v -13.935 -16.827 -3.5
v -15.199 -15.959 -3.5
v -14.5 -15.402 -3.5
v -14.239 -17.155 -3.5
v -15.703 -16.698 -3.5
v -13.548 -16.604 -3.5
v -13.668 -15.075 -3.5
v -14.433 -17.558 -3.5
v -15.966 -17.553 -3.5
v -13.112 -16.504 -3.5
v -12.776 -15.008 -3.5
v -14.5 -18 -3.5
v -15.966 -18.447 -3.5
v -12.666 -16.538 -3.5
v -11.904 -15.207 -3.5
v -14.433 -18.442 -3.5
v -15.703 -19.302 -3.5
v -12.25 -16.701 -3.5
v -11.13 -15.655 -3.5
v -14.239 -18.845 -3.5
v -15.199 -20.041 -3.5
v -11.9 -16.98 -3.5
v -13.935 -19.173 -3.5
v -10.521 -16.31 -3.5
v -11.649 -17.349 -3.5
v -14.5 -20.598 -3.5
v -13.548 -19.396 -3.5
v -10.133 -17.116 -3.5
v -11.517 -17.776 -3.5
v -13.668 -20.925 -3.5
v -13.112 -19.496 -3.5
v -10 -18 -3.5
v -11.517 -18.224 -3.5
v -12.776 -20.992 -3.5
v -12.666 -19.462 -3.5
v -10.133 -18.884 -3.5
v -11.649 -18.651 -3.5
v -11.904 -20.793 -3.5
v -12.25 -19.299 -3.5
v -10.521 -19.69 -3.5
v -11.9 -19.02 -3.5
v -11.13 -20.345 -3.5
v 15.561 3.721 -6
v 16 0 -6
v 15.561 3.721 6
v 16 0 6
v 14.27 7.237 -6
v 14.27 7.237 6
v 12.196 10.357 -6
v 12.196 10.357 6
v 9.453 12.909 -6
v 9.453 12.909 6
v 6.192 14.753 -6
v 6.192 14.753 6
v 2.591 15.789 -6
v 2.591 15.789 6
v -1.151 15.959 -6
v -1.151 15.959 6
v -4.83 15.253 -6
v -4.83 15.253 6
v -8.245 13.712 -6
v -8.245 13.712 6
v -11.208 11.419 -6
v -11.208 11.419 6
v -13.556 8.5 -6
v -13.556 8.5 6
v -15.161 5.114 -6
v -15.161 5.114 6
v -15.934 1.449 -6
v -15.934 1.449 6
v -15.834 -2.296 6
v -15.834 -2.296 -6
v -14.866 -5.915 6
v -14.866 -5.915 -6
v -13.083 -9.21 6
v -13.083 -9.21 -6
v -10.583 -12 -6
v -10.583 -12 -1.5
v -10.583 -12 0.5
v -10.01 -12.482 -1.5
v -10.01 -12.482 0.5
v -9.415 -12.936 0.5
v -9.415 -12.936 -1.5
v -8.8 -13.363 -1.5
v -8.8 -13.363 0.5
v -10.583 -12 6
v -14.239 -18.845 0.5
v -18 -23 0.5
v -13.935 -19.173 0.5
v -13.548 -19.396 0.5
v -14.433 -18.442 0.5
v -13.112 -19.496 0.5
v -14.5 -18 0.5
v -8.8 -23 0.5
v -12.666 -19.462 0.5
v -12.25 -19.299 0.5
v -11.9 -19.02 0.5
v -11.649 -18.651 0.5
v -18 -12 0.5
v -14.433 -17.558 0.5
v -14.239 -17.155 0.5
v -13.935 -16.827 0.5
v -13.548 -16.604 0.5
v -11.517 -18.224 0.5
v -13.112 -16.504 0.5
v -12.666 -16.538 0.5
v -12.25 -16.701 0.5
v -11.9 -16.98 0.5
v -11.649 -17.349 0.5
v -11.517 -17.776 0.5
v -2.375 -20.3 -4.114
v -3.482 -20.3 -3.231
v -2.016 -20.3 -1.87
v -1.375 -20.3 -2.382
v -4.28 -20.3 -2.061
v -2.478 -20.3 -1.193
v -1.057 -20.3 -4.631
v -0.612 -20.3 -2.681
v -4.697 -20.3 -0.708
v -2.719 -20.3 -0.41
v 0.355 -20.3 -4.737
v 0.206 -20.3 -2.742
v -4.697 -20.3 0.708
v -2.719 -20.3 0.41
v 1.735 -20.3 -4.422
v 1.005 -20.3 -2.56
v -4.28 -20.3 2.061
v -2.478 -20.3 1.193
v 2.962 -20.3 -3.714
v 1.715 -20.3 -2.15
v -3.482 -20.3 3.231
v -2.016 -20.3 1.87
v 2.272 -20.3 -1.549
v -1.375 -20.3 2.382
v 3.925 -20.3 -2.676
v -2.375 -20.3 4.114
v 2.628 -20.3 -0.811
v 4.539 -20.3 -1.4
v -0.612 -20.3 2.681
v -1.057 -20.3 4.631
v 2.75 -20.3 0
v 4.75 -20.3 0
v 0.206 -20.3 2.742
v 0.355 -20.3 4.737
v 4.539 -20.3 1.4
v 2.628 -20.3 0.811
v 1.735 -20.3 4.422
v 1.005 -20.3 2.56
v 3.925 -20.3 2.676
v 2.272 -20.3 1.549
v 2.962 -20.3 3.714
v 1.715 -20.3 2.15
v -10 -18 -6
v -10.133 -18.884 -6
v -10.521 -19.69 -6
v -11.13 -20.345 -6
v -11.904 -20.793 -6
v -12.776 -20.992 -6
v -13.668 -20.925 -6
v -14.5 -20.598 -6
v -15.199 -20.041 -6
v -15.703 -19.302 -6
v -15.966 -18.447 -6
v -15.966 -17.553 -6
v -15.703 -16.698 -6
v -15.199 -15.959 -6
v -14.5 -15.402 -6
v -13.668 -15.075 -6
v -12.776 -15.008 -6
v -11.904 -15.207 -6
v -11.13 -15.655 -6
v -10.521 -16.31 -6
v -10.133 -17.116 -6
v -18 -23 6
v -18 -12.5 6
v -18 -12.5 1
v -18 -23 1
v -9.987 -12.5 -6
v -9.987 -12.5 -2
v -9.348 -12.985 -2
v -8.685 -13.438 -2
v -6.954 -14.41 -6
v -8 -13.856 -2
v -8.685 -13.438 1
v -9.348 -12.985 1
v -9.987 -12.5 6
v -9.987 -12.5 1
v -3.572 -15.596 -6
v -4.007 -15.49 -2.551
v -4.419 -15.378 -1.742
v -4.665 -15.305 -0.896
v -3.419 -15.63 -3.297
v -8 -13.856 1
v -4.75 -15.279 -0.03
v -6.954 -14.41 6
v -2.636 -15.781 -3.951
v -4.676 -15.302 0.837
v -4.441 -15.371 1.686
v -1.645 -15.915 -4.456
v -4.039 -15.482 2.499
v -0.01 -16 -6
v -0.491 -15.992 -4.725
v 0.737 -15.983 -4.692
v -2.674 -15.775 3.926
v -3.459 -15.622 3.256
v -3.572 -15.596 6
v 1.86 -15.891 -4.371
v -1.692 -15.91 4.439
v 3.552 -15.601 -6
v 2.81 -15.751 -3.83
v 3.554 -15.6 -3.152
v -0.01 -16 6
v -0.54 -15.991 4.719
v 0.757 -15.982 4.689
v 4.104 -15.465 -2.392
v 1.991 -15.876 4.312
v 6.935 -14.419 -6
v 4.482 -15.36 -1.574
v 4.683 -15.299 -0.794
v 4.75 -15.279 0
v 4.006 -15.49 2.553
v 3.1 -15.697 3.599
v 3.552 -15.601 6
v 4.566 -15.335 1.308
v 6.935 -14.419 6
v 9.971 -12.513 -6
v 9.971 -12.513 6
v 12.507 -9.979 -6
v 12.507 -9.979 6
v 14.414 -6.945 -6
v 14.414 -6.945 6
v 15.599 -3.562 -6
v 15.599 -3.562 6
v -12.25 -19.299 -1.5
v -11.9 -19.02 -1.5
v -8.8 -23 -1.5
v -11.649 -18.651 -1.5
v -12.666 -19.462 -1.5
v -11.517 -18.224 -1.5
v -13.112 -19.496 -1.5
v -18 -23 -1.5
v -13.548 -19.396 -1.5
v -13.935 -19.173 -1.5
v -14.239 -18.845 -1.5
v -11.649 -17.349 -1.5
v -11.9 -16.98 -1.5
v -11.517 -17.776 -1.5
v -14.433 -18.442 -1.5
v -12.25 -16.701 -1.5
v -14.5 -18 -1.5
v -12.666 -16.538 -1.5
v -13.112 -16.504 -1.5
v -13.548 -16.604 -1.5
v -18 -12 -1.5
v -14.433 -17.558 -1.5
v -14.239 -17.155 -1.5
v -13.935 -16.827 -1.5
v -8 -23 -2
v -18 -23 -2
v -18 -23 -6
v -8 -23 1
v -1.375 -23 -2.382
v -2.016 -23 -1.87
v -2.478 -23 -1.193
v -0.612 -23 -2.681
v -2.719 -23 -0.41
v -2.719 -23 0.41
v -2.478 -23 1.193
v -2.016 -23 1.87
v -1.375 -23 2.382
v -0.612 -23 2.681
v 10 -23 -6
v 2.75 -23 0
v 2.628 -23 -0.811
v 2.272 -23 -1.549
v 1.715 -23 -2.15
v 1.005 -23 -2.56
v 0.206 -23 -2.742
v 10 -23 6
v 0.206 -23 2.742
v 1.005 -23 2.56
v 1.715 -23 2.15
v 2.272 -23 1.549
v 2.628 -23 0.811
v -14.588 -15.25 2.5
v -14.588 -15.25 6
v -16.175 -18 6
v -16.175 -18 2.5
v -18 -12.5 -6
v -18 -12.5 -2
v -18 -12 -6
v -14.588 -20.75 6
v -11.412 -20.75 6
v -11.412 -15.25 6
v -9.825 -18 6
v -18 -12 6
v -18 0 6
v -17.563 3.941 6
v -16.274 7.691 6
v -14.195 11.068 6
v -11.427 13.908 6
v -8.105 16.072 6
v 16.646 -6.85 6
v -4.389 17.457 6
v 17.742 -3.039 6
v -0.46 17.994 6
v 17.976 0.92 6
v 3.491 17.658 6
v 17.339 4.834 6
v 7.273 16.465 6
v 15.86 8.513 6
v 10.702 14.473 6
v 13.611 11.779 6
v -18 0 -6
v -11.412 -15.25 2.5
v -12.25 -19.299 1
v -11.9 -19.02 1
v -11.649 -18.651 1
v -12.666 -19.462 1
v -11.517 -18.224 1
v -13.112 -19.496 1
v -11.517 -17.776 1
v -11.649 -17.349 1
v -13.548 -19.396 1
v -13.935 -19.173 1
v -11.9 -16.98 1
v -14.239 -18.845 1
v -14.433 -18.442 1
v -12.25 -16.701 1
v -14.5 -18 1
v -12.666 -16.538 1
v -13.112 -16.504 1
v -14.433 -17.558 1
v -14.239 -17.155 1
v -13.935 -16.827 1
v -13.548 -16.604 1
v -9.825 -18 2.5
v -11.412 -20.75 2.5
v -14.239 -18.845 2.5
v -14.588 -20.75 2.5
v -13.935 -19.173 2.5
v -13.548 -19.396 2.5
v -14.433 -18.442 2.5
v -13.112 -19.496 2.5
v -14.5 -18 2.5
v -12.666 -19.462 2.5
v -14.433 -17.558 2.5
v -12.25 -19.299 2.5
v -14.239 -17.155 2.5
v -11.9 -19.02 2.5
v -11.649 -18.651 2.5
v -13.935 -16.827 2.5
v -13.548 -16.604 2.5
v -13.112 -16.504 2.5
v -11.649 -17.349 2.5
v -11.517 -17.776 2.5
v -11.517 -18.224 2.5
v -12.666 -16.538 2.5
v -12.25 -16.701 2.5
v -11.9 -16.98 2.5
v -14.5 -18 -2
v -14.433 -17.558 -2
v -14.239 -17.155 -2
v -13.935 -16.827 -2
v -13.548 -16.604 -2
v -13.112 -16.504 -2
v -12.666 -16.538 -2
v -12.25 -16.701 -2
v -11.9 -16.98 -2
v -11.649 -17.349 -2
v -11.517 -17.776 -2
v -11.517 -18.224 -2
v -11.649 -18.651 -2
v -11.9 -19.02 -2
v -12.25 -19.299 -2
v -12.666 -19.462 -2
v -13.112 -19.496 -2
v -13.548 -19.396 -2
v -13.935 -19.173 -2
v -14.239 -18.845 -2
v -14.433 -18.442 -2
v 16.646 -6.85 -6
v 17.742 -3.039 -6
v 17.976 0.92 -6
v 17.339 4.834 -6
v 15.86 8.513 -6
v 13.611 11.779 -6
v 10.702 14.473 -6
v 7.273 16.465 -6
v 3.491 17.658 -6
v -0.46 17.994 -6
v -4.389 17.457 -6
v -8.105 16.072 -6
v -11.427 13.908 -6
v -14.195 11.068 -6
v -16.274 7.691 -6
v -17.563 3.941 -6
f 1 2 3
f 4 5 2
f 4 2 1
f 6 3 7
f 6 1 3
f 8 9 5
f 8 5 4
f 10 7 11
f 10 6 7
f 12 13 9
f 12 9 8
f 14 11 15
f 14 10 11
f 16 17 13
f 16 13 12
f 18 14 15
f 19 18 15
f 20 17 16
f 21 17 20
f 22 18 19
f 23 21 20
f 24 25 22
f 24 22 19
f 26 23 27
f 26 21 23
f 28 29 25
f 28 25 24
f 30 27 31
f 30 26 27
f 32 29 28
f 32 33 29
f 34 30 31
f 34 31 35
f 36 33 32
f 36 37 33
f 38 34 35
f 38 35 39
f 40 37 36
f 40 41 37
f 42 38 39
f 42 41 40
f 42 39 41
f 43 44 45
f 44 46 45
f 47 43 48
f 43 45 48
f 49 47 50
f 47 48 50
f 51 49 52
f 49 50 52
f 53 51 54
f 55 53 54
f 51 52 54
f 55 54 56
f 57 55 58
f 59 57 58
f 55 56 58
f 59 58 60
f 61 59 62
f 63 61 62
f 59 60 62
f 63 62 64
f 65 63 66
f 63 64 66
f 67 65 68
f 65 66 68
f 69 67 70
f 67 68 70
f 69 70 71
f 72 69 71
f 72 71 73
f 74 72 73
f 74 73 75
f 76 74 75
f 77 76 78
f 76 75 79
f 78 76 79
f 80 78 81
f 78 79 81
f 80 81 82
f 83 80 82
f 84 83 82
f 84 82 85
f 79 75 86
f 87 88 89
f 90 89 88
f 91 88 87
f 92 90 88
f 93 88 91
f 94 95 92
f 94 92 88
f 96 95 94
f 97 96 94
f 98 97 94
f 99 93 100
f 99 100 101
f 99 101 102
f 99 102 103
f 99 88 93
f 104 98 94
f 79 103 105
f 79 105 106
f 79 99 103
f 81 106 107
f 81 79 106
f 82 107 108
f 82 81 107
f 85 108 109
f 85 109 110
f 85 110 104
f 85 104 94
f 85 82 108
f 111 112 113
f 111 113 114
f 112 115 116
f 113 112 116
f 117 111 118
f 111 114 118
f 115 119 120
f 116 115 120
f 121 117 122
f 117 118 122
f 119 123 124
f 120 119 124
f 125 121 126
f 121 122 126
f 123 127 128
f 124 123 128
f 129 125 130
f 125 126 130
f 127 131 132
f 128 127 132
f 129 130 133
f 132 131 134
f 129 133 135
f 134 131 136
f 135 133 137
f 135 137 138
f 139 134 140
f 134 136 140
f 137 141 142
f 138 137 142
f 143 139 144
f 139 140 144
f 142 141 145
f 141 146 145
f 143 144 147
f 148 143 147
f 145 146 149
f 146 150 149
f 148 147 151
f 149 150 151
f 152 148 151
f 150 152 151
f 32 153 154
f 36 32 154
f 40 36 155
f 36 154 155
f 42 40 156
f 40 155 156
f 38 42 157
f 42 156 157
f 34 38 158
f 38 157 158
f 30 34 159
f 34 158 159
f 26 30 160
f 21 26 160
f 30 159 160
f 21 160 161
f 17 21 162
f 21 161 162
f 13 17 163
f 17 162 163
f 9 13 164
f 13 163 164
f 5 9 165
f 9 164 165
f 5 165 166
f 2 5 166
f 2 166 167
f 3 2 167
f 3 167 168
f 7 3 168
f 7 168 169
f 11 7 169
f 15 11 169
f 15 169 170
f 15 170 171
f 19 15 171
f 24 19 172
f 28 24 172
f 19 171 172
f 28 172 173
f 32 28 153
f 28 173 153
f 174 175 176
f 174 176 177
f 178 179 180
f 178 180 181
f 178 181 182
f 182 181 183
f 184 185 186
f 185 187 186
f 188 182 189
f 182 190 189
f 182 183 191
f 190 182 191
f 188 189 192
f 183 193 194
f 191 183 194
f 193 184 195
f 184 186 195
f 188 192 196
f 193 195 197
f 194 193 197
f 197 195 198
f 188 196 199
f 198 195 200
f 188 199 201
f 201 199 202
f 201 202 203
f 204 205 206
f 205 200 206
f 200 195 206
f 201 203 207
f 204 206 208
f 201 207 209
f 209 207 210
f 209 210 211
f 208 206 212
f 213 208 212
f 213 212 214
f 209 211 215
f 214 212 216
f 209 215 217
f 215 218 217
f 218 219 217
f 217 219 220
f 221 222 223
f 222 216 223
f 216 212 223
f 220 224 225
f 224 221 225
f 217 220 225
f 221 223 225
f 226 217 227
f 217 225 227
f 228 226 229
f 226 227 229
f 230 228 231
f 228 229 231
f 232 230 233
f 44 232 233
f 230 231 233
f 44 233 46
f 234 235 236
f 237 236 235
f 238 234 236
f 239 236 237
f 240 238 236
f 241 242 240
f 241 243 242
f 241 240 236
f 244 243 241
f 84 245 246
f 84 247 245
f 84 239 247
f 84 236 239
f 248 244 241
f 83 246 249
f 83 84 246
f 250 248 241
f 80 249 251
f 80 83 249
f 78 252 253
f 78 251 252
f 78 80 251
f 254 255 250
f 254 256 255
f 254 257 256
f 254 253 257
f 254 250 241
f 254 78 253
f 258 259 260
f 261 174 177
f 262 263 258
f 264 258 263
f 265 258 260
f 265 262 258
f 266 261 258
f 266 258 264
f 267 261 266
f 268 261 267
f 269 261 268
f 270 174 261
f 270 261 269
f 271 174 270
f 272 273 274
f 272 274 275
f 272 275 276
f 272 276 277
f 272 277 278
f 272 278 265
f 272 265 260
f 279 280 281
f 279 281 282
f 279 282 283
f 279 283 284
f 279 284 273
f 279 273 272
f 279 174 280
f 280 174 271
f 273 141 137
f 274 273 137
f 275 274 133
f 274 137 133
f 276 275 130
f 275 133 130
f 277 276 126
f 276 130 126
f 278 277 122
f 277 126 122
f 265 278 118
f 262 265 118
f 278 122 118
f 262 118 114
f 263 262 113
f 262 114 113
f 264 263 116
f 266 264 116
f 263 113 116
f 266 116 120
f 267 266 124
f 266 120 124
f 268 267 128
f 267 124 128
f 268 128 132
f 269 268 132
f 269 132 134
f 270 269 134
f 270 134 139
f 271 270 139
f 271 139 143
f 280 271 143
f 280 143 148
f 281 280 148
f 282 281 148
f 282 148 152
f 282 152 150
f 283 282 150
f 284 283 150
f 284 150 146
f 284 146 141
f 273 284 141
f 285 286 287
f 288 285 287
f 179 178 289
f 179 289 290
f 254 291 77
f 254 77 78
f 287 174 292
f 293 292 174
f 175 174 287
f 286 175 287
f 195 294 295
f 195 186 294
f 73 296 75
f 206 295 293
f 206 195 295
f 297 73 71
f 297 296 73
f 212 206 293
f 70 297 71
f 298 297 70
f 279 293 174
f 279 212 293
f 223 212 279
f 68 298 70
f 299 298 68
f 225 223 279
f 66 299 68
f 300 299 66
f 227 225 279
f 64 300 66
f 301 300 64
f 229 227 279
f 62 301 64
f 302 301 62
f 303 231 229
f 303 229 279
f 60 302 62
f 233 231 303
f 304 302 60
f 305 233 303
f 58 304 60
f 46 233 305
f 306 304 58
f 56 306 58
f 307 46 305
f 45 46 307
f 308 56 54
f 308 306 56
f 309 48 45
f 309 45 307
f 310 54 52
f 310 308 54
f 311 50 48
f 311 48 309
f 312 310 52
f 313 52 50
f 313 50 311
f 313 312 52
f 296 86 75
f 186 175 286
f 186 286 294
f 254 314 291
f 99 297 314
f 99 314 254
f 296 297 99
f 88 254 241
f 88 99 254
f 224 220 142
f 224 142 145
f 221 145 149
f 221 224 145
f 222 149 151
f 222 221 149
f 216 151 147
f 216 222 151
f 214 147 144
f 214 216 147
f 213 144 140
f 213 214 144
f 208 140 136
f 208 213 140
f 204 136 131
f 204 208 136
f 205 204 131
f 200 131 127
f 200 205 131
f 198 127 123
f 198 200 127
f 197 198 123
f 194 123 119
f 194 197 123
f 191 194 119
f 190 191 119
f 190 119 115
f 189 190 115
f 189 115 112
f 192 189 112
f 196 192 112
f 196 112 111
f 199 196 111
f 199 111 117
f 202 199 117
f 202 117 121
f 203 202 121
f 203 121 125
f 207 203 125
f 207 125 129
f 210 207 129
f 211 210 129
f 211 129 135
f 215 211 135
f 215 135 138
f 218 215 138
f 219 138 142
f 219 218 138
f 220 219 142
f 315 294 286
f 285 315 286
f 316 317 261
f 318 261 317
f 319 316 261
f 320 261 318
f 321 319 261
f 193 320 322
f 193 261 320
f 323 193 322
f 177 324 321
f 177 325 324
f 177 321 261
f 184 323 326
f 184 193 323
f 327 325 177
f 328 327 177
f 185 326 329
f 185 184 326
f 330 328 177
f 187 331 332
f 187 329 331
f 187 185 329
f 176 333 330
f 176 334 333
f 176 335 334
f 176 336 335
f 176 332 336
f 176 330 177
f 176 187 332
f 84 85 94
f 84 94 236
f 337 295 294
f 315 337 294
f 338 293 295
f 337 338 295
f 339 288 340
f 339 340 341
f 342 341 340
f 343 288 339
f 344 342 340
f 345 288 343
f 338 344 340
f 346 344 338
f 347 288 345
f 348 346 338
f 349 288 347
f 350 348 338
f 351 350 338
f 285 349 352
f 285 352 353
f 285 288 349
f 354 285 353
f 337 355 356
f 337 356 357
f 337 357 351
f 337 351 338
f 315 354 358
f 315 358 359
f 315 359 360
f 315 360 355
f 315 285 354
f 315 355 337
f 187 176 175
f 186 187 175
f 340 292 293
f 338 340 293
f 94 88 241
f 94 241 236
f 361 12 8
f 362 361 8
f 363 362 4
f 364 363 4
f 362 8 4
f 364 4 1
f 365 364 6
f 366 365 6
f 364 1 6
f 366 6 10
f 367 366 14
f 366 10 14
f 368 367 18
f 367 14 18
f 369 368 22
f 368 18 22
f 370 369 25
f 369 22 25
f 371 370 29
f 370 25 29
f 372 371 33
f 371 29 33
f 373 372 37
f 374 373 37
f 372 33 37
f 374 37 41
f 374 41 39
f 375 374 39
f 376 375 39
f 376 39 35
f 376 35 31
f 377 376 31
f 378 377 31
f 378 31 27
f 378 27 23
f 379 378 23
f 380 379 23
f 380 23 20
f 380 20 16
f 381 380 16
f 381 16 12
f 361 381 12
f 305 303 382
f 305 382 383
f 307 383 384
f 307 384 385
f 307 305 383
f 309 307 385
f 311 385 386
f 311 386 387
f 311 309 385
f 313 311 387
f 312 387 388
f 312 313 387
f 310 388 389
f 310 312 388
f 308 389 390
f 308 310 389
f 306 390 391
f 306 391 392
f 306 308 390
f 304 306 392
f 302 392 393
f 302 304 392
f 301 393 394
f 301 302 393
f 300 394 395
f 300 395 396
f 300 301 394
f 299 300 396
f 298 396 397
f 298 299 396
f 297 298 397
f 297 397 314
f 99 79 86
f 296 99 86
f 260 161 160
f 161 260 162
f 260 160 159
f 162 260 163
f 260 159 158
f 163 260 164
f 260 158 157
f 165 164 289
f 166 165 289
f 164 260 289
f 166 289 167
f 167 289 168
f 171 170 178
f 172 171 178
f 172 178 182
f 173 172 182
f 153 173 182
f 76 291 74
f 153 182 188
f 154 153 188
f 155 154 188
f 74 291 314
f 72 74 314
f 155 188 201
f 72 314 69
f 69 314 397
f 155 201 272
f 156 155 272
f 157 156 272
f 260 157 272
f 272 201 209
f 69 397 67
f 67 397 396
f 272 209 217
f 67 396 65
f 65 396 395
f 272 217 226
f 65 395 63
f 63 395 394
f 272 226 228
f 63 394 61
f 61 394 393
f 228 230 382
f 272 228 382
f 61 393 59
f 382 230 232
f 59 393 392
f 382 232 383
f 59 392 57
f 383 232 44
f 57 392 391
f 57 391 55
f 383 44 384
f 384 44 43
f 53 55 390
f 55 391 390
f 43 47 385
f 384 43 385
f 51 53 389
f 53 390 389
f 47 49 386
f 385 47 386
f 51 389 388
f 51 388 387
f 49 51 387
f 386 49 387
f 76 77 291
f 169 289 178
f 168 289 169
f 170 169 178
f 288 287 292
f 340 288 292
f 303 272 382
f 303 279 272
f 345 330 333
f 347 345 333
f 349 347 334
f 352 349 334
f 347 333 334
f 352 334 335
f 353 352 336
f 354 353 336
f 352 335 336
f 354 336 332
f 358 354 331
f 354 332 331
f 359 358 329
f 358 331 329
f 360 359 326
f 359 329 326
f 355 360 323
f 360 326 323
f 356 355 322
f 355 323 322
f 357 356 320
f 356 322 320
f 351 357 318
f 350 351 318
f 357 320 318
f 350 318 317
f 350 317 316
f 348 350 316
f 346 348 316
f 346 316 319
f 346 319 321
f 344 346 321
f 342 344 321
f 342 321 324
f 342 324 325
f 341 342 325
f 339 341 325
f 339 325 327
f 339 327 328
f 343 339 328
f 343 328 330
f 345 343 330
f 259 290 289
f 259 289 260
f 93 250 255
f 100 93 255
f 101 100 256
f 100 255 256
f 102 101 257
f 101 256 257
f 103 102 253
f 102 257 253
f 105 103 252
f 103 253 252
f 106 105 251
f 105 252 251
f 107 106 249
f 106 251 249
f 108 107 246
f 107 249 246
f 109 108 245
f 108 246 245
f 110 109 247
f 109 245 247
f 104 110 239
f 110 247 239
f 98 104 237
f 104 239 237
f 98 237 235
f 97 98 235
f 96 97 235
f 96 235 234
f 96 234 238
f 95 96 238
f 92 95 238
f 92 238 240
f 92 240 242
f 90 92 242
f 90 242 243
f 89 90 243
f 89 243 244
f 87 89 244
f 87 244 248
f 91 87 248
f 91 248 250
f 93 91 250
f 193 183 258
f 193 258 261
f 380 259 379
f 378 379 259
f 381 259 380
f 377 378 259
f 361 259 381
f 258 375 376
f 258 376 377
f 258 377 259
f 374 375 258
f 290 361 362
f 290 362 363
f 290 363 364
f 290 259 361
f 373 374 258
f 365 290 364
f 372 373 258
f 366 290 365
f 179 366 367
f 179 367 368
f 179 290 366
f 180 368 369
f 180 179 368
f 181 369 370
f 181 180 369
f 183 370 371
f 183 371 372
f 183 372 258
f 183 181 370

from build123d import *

# Parameters (mm, degrees)
F0_R          = 16
F1_DEPTH      = 6
F1_DEPTH_BACK = 6
F4_DEPTH      = 25
F5_W          = 0.5
F5_H          = 4
F5_H_2        = 5
F6_DEPTH      = 8.0135078223
F8_D          = 3
F9_DEPTH      = 3.5
F10_R         = 3
F11_DEPTH     = 2.5
F13_D         = 5.5
F13_DEPTH     = 23.001
F14_R         = 4.75
F15_DEPTH     = 20.3


with BuildPart() as f1:
    # F0 (on Top) → F1 (new body, two sides)
    with BuildSketch(Plane.XY) as f1_sk:
        with BuildLine():
            Line((10, -23), (16.6457856397, -6.8496584175))
            ThreePointArc((16.6457856397, -6.8496584175), (3.4911214878, 17.6582012322), (-18, 0))
            Line((-18, 0), (-18, -23))
            Line((-18, -23), (10, -23))
        make_face()
        Circle(F0_R, mode=Mode.SUBTRACT)
    extrude(amount=F1_DEPTH)
    extrude(f1_sk.sketch, amount=-F1_DEPTH_BACK)

    # F3 (on offset) → F4 (cut)
    with BuildSketch(Plane.XZ.offset(12)):
        Polygon((-8.8, -1.5), (-18, -1.5), (-18, -2), (-8, -2), (-8, 1), (-18, 1), (-18, 0.5), (-8.8, 0.5), align=None)
    extrude(amount=F4_DEPTH, mode=Mode.SUBTRACT)

    # F5 (on face) → F6 (cut, through all)
    with BuildSketch(Plane(origin=(-18, 0, 0), x_dir=(0, -1, 0), z_dir=(-1, 0, 0))):
        with Locations((12.25, -4)):
            Rectangle(F5_W, F5_H)
        with Locations((12.25, 3.5)):
            Rectangle(F5_W, F5_H_2)
    extrude(amount=-F6_DEPTH, mode=Mode.SUBTRACT)

    # F8 (through all)
    with Locations(Plane.XY.offset(6)):
        with Locations((-13, -18)):
            Hole(F8_D / 2)

    # F7 (on face) → F9 (cut)
    with BuildSketch(Plane.XY.offset(6)):
        Polygon((-11.4122867597, -20.75), (-9.8245735195, -18), (-11.4122867597, -15.25), (-14.5877132403, -15.25), (-16.1754264805, -18), (-14.5877132403, -20.75), align=None)
    extrude(amount=-F9_DEPTH, mode=Mode.SUBTRACT)

    # F10 (on face) → F11 (cut)
    with BuildSketch(Plane(origin=(0, 0, -6), x_dir=(1, 0, 0), z_dir=(0, 0, -1))):
        with Locations((-13, 18)):
            Circle(F10_R)
    extrude(amount=-F11_DEPTH, mode=Mode.SUBTRACT)

    # F13 (through all, one way)
    with BuildSketch(Plane(origin=(0, 0, 0), x_dir=(1, 0, 0), z_dir=(0, 1, 0))):
        with Locations((0, 0)):
            Circle(F13_D / 2)
    extrude(amount=-F13_DEPTH, mode=Mode.SUBTRACT)

    # F14 (on Front) → F15 (cut)
    with BuildSketch(Plane.XZ):
        Circle(F14_R)
    extrude(amount=F15_DEPTH, mode=Mode.SUBTRACT)


solid = f1.part
